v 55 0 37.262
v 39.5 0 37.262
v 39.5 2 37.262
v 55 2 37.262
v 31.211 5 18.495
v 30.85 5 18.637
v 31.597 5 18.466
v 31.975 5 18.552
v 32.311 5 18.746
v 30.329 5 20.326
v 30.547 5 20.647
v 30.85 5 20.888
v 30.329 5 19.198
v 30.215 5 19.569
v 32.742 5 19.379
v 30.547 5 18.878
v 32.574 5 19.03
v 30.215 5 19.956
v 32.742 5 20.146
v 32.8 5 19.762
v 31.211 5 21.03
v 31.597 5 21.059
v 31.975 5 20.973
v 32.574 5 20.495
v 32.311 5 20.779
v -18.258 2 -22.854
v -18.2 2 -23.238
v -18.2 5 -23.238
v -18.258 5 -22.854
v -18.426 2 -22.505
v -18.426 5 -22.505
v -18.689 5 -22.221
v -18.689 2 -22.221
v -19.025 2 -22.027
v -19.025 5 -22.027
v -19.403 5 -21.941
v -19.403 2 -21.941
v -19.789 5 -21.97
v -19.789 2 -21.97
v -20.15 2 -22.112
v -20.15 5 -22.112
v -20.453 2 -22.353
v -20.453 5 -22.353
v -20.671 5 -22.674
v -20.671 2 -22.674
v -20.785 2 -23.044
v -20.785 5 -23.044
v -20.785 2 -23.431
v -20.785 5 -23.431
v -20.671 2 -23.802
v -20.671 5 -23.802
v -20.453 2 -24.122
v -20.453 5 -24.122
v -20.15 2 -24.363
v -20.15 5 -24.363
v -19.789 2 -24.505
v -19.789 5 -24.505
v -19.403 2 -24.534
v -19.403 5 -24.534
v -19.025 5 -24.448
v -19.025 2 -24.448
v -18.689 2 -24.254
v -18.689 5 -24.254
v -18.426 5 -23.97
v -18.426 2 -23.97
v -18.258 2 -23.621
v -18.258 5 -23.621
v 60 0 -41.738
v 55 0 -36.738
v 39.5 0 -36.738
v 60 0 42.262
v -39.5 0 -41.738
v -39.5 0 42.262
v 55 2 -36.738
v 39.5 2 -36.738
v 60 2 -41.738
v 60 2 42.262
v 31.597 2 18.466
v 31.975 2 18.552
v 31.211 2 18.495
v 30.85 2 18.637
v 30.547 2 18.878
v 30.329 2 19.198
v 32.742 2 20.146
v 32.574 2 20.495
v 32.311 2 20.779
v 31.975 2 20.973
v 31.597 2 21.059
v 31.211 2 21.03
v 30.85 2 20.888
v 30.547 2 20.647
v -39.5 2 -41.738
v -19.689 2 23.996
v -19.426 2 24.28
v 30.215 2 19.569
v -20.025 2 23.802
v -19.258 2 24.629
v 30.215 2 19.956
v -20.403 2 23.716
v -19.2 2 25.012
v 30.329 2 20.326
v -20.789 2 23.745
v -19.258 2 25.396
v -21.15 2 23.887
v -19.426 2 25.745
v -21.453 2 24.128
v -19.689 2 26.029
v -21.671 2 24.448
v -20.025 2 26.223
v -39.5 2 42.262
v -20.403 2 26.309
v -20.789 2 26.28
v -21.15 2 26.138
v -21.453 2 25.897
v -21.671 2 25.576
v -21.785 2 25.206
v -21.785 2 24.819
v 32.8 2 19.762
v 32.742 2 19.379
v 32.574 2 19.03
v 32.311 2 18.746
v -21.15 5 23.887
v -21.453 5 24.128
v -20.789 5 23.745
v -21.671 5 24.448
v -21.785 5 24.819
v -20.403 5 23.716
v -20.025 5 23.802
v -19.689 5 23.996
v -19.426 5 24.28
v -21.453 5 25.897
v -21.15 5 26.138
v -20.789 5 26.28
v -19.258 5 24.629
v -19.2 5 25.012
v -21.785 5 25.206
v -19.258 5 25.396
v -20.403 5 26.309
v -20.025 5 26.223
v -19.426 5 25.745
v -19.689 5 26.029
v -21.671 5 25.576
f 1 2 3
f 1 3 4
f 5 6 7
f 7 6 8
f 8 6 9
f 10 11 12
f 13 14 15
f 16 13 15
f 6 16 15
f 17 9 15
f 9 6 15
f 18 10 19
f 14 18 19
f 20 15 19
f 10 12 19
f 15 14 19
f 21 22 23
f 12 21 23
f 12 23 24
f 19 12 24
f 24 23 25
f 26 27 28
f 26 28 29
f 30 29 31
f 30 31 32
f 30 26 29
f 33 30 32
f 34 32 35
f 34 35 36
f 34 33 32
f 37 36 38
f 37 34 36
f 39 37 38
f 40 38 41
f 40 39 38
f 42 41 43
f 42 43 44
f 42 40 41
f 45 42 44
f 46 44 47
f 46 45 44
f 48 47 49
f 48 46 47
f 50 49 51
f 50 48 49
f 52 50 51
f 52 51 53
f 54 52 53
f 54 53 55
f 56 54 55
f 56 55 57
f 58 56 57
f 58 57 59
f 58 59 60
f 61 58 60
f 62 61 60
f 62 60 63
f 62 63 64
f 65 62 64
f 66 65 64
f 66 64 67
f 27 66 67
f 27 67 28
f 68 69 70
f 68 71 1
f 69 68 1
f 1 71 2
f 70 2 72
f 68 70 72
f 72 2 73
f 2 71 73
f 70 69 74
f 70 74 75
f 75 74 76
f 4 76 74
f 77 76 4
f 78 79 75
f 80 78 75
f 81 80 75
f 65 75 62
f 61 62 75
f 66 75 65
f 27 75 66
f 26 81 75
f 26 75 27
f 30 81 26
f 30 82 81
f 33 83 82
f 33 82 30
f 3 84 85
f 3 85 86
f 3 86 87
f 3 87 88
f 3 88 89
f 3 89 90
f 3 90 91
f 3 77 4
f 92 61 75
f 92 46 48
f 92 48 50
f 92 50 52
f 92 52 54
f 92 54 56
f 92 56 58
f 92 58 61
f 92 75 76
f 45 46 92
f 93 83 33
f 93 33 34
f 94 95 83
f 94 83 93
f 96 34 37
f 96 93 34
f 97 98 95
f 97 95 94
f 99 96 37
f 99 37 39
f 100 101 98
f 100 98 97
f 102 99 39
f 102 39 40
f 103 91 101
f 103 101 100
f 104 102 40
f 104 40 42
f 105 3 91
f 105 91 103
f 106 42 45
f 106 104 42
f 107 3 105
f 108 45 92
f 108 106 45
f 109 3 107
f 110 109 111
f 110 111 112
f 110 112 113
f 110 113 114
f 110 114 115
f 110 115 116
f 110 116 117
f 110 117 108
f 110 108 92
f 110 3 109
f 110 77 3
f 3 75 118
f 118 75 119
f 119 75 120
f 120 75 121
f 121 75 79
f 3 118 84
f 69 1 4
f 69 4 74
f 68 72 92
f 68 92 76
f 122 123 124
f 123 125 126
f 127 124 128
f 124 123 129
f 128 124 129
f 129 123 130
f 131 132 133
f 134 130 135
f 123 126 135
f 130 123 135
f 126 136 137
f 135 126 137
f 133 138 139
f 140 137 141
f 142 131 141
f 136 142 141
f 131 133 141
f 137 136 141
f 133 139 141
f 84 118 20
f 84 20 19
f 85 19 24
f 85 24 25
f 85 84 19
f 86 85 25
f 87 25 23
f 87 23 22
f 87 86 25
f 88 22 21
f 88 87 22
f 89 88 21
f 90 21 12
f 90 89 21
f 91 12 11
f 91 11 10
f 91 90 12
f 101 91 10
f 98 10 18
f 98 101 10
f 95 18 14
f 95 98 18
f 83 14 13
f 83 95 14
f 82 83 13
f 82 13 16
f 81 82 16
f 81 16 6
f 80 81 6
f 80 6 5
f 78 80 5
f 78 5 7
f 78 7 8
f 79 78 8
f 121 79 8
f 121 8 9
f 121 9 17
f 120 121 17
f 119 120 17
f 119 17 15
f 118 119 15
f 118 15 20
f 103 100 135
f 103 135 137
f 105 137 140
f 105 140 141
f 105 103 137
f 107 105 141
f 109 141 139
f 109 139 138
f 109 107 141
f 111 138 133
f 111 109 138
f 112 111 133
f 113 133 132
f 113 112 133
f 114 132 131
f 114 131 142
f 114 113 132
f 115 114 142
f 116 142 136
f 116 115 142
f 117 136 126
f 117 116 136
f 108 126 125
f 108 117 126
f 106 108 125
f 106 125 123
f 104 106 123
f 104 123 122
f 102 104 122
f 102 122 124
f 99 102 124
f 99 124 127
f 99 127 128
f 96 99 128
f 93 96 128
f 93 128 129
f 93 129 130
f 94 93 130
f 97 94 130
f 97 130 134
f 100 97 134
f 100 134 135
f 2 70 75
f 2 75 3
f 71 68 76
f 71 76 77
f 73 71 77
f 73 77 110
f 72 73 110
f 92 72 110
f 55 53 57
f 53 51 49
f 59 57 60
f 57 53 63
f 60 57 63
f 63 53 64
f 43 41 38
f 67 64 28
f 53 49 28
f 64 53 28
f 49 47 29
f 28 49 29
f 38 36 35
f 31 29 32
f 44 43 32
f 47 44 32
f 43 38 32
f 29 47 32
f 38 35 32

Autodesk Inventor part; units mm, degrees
ref_plane "YZ Plane" through (0, 0, 0) normal (1, 0, 0) x (0, 1, 0)
ref_plane "XZ Plane" through (0, 0, 0) normal (0, 1, 0) x (-1, 0, 0)
ref_plane "XY Plane" through (0, 0, 0) normal (0, 0, 1) x (1, 0, 0)
sketch "Szkic1" plane through (0, 0, 0) normal (0, 1, 0) x (-1, 0, 0)
  line L0 (-60, 42.2624) -> (60, 42.2624)
  line L1 (60, 42.2624) -> (60, -41.7376)
  line L2 (60, -41.7376) -> (-60, -41.7376)
  line L3 (-60, -41.7376) -> (-60, 42.2624)
  line L4 (-34.5, 26.7624) -> (34.5, 26.7624)
  line L5 (34.5, 26.7624) -> (34.5, -26.2376)
  line L6 (34.5, -26.2376) -> (-34.5, -26.2376)
  line L7 (-34.5, -26.2376) -> (-34.5, 26.7624)
  line L8 (39.5, 37.2624) -> (55, 37.2624)
  line L9 (55, 37.2624) -> (55, -36.7376)
  line L10 (55, -36.7376) -> (39.5, -36.7376)
  line L11 (39.5, -36.7376) -> (39.5, 37.2624)
  line L12 (39.5, 37.2624) -> (55, -36.7376) construction
  line L13 (55, 37.2624) -> (39.5, -36.7376) construction
  line L14 (-39.5, 37.2624) -> (-55, 37.2624)
  line L15 (-55, 37.2624) -> (-55, -36.7376)
  line L16 (-55, -36.7376) -> (-39.5, -36.7376)
  line L17 (-39.5, -36.7376) -> (-39.5, 37.2624)
  line L18 (-39.5, 37.2624) -> (-55, -36.7376) construction
  line L19 (-55, 37.2624) -> (-39.5, -36.7376) construction
  circle A0 centre (19.5, -23.2376) radius 1.3
  line L20 (0, 0) -> (11.1545, 0)
  circle A1 centre (20.5, 23.7624) radius 1.3
  circle A2 centre (-31.5, 18.7624) radius 1.3
  circle A3 centre (20.5, 23.7624) radius 1.3
  circle A4 centre (19.5, -23.2376) radius 1.3
  circle A5 centre (-31.5, 18.7624) radius 1.3
  point P0 (47.25, 0.2624)
  dimension "d0" = 120
  dimension "d1" = 84
  dimension "d4" = 69
  dimension "d5" = 53
  dimension "d8" = 5
  dimension "d9" = 5
  dimension "d13" = 2.6
  dimension "d14" = 3
  dimension "d15" = 15
  dimension "d16" = 15.5
  dimension "d17" = 15.5
  dimension "d18" = 25.5
  dimension "d19" = 5
  dimension "d20" = 5
  dimension "d23" = 2.6
  dimension "d24" = 3
  dimension "d25" = 14
  dimension "d28" = 2.6
extrude "Wyciągnięcie proste1" add sketch "Szkic1" along normal blind 2 contours L0 L1 L2 L3 | L4 L5 L6 L7 | A0 | A1 | A2
sketch "Szkic3" plane through (0, 0, 0) normal (0, -1, 0) x (1, 0, 0)
  circle A0 centre (-20.5, 23.7624) radius 1.3
  circle A1 centre (31.5, 18.7624) radius 1.3 projected
  circle A2 centre (-19.5, -23.2376) radius 1.3 projected
  circle A3 centre (-19.5, -23.2376) radius 1.3
  circle A4 centre (-20.5, 25.0124) radius 1.3
  line L0 (31.5, 18.7624) -> (31.5, 19.7624)
  circle A5 centre (31.5, 19.7624) radius 1.3
  point P0 (0, 0)
  dimension "d31" = 2.6
  dimension "d32" = 48.25
  dimension "d36" = 1
extrude "Wyciągnięcie proste2" add sketch "Szkic3" against normal blind 5 contours A4 A0 | A0 A4 | A5 A1 | A1 A5 | A2 picked at (-20.4486, 24.1655) picked at (-20.5582, 25.8863) picked at (31.399, 19.5171) picked at (31.6684, 20.3785)
sketch "Szkic4" plane through (0, 0, 0) normal (0, -1, 0) x (1, 0, 0)
  arc A0 (-21.6399, 24.3874) -> (-19.3601, 24.3874) centre (-20.5, 23.7624) ccw projected
  circle A1 centre (-20.5, 23.7624) radius 1.3
  arc A2 (30.3, 19.2624) -> (32.7, 19.2624) centre (31.5, 18.7624) ccw projected
  circle A3 centre (31.5, 18.7624) radius 1.3
  point P0 (0, 0)
  point P1 (32.7, 19.2624)
extrude "Wyciągnięcie proste3" add sketch "Szkic4" against normal blind 2
sketch "Szkic5" plane through (-60, 0, 42.2624) normal (0, 0, 1) x (1, 0, 0)
  line L0 (0, 0) -> (0, 2) projected
  line L1 (5, 0) -> (20.5, 0) projected
  line L2 (0, 0) -> (20.5, 0)
  line L3 (5, 2) -> (20.5, 2) projected
  line L4 (20.5, 0) -> (20.5, 2)
  line L5 (20.5, 2) -> (0, 2)
  line L6 (0, 2) -> (0, 0)
  point P0 (60, 0)
extrude "Wyciągnięcie proste4" cut sketch "Szkic5" against normal up to surface (84 mm away)
properties part number "gora"
